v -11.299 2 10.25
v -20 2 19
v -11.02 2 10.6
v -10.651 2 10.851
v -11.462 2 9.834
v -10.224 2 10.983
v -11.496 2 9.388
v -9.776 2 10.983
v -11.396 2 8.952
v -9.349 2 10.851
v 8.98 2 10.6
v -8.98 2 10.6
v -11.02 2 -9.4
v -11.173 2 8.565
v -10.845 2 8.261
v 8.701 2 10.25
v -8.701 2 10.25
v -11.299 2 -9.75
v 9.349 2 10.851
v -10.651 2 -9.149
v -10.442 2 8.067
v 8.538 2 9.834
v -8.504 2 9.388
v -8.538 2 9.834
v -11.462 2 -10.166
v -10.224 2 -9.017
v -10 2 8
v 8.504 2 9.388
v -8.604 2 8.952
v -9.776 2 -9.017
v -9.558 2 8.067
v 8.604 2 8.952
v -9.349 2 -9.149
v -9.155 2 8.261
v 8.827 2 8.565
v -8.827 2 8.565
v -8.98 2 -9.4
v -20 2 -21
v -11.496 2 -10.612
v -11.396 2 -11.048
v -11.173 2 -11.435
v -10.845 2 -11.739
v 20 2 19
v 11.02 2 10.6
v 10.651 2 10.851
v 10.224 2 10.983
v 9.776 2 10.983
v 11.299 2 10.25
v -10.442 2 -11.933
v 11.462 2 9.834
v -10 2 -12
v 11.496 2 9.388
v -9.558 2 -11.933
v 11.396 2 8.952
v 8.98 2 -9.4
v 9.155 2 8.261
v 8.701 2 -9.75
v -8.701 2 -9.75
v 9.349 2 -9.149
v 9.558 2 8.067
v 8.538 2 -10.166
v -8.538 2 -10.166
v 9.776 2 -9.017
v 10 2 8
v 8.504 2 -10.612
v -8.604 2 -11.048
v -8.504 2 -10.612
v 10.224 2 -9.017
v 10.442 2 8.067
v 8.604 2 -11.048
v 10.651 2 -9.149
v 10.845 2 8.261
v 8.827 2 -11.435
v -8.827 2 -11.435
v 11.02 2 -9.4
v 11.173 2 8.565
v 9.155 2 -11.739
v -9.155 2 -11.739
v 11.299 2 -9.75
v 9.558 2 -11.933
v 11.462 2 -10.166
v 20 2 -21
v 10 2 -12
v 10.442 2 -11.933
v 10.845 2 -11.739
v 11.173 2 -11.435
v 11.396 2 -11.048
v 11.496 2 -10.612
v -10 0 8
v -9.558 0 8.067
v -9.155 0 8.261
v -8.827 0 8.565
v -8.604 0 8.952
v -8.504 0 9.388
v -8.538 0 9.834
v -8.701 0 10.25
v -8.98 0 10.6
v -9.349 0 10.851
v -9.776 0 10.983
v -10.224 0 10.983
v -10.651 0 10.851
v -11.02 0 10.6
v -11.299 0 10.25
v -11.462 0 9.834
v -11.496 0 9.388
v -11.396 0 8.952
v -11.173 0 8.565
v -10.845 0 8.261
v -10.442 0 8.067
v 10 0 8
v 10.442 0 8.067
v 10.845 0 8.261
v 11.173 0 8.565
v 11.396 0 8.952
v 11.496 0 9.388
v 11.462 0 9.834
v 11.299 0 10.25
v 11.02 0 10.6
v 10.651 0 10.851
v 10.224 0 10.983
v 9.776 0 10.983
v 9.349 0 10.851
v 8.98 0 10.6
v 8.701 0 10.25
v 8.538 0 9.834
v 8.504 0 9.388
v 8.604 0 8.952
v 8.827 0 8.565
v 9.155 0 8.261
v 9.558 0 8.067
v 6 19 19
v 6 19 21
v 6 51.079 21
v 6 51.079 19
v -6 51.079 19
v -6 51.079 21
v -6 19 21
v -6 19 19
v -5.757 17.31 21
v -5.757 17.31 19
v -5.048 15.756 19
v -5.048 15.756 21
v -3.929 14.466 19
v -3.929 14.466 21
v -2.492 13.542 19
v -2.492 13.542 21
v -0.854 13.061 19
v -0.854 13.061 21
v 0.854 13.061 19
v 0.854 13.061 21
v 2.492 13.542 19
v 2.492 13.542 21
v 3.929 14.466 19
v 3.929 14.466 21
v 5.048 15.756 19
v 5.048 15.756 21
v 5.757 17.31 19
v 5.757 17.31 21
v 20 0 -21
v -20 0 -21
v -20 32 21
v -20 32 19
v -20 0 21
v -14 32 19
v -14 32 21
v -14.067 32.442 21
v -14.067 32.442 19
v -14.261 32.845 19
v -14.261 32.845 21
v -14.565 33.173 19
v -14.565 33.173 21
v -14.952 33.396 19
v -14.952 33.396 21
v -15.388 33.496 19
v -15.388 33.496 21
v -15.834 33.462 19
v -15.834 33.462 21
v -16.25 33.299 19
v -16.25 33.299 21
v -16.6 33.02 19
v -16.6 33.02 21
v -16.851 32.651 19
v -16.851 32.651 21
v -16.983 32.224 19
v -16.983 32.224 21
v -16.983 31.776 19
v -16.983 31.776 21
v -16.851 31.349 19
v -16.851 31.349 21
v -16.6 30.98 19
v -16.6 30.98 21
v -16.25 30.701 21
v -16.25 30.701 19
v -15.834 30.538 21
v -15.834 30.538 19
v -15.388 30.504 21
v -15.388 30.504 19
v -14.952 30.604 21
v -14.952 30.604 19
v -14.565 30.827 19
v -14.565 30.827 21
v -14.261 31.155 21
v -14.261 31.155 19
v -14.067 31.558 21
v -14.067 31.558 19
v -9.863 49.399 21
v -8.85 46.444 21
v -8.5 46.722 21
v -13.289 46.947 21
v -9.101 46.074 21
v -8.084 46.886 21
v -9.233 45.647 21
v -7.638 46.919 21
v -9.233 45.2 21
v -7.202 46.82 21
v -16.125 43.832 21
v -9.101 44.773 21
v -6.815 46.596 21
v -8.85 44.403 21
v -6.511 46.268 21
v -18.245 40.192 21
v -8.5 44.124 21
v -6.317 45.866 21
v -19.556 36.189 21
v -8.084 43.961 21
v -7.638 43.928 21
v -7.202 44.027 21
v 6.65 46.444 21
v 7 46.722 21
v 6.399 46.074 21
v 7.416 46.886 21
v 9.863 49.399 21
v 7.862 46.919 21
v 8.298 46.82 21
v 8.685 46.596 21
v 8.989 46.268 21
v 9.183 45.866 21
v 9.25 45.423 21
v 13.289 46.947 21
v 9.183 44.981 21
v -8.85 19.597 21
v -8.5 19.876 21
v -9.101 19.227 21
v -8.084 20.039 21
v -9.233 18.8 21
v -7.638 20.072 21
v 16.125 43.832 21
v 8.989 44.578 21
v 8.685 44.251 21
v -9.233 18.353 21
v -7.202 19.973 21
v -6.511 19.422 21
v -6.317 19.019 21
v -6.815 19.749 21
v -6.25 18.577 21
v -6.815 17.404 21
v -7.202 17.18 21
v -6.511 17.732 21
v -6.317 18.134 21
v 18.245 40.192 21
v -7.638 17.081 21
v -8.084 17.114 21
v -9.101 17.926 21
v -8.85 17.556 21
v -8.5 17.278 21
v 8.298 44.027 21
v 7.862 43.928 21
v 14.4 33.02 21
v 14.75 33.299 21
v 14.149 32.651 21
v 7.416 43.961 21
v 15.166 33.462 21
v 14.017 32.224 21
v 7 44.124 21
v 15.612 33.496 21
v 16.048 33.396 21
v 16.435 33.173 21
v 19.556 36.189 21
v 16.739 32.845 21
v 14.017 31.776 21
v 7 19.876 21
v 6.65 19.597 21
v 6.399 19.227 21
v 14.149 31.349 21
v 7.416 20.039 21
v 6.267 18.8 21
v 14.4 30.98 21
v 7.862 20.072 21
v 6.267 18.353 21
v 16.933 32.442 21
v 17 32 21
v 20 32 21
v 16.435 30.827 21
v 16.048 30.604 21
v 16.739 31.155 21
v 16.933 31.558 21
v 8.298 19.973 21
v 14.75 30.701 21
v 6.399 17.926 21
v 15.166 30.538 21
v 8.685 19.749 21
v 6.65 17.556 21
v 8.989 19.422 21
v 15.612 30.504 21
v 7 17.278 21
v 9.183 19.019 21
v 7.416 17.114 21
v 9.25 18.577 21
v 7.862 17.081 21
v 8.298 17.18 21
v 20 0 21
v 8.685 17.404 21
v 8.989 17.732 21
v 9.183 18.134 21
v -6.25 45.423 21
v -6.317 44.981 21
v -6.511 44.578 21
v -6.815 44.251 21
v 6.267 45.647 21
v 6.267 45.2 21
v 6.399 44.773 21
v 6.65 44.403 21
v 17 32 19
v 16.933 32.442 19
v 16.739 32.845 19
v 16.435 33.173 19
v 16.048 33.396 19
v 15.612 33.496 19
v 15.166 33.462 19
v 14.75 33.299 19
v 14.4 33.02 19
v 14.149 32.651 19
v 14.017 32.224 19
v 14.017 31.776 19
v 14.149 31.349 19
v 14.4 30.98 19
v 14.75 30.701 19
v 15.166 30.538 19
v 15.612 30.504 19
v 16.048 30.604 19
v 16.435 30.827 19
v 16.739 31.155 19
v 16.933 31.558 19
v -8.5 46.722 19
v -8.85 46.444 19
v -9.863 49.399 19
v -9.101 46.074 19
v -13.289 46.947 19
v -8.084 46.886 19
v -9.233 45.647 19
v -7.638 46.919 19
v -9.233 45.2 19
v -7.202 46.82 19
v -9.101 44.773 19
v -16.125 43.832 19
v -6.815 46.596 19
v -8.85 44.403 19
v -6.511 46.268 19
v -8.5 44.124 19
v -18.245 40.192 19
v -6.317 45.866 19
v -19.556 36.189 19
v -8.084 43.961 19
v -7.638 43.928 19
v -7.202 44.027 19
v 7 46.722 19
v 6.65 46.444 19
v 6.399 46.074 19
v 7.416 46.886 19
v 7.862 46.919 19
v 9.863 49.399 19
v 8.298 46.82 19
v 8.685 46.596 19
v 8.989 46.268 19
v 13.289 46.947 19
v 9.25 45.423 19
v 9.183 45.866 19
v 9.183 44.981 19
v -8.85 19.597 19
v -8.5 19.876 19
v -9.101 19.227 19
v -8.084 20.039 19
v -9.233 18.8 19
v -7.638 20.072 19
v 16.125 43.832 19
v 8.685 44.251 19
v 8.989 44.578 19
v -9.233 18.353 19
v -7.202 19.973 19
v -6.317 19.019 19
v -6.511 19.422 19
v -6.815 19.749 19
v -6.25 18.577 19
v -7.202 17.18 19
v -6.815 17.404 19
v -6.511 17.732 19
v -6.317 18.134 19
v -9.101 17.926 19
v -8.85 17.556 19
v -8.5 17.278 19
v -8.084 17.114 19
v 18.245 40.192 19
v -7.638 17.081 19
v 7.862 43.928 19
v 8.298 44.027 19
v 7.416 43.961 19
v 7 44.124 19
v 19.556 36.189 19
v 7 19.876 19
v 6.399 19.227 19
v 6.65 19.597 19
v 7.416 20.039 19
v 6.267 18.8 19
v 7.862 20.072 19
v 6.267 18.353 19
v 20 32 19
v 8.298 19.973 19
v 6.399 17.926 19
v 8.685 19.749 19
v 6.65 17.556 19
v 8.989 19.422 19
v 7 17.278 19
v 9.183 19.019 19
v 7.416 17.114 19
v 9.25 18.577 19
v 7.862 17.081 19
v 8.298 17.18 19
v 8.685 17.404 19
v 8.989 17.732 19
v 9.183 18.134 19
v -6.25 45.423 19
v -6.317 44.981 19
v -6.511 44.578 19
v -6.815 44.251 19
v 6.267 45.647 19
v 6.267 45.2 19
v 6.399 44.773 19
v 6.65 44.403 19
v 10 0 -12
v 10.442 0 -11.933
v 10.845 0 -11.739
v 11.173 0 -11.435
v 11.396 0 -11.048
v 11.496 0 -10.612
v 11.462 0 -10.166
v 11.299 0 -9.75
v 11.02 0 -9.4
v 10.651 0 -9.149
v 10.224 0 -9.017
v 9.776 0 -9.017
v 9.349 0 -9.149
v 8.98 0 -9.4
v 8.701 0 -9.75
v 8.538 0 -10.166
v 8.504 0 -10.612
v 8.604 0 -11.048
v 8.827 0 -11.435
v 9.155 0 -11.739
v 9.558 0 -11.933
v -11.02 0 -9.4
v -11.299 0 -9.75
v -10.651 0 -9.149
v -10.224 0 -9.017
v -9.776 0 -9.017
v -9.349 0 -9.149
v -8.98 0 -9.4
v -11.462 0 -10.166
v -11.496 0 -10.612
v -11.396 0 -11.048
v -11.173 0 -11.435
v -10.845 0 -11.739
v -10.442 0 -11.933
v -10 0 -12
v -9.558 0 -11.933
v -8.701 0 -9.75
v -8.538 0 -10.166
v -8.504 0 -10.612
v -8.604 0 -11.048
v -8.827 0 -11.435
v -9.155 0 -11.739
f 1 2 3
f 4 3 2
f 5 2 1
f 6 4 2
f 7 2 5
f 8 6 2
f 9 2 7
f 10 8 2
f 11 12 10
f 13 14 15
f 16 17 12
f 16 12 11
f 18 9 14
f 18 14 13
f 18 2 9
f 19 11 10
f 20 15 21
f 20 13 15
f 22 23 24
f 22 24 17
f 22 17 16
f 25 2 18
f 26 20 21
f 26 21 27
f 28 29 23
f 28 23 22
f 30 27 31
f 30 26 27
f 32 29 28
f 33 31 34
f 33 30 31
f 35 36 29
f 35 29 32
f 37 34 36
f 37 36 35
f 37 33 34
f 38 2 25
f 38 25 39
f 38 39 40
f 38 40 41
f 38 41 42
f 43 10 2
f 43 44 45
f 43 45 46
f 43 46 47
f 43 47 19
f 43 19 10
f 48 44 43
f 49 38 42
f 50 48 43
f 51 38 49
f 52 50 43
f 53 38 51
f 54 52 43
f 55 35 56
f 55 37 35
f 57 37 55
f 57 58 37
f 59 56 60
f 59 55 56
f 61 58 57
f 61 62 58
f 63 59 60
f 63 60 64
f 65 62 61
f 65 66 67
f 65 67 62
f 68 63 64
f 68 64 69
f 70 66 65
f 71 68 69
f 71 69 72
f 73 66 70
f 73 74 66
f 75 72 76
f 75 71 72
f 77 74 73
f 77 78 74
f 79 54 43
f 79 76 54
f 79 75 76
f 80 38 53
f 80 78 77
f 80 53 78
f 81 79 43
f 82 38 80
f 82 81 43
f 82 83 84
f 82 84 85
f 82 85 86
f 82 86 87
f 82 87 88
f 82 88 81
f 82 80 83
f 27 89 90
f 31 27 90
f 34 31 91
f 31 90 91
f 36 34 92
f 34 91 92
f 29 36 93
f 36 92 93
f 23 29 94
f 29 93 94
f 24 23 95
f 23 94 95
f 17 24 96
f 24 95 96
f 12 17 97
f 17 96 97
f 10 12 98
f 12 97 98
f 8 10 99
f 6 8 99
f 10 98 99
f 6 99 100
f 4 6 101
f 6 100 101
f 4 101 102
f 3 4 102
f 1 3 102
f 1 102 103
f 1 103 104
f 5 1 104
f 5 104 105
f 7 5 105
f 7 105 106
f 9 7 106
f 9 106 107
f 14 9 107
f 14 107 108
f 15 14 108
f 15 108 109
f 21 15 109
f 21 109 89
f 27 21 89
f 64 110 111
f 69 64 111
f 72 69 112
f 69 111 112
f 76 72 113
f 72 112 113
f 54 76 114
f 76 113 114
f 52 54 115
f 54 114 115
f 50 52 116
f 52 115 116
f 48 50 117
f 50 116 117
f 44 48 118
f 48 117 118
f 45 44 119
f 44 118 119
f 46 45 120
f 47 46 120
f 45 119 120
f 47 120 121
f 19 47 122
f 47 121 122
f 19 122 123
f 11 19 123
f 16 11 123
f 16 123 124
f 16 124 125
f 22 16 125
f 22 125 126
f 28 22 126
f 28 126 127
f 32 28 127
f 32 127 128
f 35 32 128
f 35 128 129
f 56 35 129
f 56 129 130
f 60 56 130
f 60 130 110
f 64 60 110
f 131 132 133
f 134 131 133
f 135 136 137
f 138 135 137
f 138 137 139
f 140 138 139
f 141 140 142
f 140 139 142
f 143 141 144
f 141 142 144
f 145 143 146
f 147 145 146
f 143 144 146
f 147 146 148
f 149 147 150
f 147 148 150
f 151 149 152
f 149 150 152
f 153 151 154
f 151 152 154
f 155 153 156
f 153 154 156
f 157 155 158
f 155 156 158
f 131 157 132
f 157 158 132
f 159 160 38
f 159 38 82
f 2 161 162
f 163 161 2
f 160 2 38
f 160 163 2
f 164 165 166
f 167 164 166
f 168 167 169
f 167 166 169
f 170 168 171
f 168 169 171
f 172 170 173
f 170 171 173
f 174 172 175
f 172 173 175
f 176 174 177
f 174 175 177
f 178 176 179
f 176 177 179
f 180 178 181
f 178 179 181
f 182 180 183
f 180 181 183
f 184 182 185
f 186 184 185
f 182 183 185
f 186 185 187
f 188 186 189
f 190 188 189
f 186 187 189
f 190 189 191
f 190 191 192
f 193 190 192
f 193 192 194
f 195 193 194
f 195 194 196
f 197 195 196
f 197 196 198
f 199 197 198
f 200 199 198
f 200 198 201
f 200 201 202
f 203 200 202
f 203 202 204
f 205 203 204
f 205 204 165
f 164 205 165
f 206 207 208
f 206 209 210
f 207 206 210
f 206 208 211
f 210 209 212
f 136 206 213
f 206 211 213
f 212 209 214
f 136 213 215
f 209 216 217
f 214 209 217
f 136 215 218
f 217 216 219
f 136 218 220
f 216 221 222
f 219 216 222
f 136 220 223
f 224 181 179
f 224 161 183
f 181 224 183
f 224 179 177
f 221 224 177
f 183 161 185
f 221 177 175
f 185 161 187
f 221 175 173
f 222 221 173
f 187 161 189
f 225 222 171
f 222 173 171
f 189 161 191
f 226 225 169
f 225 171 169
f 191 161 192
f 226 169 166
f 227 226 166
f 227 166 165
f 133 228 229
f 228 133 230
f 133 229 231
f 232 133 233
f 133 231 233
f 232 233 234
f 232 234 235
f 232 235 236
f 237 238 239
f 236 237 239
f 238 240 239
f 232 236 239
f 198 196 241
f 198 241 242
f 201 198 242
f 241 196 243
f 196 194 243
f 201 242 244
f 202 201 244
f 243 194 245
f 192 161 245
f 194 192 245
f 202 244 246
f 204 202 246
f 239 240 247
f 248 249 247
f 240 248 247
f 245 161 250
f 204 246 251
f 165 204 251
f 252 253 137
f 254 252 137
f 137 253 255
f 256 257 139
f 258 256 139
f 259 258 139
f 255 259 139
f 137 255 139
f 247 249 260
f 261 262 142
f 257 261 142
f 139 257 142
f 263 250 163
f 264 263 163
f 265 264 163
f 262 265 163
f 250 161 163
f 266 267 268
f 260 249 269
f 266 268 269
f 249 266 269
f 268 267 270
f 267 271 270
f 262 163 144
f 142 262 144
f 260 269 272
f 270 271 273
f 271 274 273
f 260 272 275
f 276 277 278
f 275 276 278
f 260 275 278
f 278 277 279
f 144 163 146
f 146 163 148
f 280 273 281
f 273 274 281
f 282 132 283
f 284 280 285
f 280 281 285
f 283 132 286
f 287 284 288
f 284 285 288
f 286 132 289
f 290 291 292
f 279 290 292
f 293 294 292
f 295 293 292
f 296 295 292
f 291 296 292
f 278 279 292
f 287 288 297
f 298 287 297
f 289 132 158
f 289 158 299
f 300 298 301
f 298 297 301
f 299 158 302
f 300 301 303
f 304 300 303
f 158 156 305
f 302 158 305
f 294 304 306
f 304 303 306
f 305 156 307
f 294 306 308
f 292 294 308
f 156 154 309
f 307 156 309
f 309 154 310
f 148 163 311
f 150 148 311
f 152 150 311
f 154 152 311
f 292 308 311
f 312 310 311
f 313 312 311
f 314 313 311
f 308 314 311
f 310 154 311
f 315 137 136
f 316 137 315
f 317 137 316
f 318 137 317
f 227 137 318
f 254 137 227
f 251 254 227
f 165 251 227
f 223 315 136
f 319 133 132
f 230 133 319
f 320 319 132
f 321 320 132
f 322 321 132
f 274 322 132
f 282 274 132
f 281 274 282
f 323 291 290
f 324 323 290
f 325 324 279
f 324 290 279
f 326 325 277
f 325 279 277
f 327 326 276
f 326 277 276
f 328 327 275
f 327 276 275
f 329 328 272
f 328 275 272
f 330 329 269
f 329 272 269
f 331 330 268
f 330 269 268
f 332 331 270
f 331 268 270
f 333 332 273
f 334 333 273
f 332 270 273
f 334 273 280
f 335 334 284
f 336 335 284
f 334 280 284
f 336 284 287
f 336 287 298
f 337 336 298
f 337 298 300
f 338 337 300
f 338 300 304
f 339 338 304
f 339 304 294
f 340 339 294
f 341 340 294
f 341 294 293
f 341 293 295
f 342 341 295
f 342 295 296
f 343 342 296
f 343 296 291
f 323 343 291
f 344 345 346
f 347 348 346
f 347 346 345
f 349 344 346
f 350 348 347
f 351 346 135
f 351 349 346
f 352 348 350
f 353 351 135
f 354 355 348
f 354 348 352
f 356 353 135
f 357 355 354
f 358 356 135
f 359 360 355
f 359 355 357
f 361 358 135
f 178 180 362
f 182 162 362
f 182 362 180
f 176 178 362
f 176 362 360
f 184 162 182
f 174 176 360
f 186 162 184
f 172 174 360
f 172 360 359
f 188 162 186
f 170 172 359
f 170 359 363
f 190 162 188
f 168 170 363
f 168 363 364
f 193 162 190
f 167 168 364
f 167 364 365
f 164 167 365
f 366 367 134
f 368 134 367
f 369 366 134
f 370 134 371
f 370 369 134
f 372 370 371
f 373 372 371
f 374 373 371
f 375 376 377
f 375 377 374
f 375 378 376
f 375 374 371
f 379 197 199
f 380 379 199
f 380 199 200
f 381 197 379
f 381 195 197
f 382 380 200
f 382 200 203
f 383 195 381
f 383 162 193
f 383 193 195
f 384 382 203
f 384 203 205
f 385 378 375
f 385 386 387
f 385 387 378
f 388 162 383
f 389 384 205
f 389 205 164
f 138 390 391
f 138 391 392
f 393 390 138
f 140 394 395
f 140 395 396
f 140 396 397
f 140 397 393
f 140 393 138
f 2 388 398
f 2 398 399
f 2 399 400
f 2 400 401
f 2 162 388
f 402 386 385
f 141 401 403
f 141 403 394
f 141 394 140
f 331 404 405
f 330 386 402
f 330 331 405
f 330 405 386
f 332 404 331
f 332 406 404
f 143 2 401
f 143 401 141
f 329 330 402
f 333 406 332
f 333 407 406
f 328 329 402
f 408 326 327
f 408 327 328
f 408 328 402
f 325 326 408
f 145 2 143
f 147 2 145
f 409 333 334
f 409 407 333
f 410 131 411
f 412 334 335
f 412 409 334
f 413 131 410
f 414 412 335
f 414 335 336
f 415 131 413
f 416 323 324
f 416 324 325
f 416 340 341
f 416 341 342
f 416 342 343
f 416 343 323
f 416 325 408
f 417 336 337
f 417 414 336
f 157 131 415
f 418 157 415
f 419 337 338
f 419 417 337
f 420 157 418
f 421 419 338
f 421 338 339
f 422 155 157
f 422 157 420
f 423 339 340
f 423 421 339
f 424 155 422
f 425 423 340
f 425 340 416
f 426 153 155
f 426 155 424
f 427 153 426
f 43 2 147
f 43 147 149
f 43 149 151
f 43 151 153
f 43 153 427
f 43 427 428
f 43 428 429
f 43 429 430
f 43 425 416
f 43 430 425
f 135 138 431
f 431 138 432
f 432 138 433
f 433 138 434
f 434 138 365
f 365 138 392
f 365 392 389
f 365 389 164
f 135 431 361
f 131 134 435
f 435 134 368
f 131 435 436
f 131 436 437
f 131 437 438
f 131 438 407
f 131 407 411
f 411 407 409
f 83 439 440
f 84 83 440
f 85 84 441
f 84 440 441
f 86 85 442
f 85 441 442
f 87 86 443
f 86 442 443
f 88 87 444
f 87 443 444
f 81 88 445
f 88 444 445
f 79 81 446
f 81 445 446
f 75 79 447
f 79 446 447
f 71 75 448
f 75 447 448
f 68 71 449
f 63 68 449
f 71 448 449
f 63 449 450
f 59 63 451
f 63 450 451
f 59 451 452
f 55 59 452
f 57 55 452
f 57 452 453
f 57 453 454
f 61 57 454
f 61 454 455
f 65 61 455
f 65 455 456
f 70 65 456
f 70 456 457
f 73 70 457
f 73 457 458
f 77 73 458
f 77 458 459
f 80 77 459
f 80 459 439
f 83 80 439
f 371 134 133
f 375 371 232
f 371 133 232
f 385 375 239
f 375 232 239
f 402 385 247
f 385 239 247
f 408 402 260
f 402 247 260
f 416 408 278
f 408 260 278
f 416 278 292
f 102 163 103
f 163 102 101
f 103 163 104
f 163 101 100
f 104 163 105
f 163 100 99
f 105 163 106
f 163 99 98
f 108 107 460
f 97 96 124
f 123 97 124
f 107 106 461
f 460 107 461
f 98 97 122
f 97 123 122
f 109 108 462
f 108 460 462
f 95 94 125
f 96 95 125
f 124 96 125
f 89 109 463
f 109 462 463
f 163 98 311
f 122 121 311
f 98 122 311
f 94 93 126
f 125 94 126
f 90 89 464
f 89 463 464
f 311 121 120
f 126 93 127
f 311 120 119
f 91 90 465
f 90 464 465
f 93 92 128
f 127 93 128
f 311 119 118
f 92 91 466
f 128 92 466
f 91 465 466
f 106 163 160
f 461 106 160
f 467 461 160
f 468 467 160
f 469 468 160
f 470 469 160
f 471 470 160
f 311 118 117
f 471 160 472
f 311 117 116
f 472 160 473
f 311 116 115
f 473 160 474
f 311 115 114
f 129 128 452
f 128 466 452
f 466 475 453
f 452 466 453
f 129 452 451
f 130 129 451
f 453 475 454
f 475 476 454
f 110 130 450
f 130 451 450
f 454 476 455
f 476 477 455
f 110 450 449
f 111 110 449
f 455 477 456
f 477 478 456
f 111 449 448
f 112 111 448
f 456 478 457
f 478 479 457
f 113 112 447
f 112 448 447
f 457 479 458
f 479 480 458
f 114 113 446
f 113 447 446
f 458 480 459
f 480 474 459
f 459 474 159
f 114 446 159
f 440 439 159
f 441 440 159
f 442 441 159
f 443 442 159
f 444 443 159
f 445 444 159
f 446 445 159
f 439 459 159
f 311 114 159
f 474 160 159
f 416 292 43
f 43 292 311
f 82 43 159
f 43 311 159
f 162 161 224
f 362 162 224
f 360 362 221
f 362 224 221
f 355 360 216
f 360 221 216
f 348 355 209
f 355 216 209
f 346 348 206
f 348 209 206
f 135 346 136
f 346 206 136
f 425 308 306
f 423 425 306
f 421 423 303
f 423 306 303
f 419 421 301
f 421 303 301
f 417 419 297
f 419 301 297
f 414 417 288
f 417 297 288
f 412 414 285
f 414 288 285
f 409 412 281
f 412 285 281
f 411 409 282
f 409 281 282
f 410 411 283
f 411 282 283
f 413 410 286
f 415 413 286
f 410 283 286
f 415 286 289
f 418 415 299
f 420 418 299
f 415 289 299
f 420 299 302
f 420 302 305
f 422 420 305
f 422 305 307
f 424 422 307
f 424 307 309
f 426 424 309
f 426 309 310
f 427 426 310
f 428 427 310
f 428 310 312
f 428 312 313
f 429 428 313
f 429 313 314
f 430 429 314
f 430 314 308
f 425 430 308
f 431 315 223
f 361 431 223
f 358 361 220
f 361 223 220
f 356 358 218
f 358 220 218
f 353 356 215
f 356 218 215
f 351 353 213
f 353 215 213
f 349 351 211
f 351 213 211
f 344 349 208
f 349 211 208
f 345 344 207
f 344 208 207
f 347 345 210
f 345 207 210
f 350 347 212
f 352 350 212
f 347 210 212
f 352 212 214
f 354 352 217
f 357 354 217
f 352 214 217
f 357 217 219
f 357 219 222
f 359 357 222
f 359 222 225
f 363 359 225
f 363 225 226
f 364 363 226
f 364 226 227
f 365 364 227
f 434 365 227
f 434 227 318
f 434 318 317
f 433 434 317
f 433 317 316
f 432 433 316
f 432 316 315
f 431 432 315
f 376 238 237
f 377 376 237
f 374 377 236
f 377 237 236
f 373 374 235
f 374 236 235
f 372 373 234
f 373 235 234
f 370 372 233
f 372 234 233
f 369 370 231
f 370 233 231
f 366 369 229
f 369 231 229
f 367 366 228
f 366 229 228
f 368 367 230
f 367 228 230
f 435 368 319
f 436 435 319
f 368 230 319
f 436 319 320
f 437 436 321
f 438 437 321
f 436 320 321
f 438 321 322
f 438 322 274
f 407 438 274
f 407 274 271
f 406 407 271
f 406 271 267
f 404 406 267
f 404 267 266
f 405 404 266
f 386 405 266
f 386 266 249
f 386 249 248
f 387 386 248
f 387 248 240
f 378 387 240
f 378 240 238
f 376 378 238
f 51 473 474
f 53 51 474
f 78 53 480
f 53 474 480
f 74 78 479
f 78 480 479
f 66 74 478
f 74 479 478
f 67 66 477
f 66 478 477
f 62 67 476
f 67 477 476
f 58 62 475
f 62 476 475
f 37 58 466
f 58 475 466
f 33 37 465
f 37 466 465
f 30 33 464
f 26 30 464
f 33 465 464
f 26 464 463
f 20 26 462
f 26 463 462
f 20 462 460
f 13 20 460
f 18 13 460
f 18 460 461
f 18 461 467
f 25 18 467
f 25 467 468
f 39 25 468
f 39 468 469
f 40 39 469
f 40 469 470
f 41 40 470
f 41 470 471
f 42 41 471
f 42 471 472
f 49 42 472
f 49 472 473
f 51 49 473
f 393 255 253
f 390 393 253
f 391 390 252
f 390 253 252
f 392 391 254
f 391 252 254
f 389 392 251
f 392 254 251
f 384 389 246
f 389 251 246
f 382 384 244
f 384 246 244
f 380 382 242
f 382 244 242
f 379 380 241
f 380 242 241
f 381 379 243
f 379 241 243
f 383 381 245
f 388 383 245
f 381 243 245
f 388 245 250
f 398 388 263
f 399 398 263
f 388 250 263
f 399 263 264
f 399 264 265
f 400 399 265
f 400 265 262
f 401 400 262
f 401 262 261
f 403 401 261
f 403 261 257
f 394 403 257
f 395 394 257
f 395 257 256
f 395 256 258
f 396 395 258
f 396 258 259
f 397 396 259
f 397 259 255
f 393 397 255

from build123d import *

# Parameters (mm, degrees)
SKETCH1_W           = 40
SKETCH1_H           = 42
BOSS_EXTRUDE1_DEPTH = 2
SKETCH2_W           = 40
SKETCH2_H           = 2
BOSS_EXTRUDE2_DEPTH = 50
CUT_EXTRUDE1_DEPTH  = 50
SKETCH4_R           = 1.5
CUT_EXTRUDE2_DEPTH  = 50
CUT_EXTRUDE3_DEPTH  = 1033
SKETCH6_R           = 1.5
CUT_EXTRUDE4_DEPTH  = 1033


with BuildPart() as part:
    # Sketch1 → Boss-Extrude1 (new body)
    with BuildSketch(Plane(origin=(0, 0, 0), x_dir=(1, 0, 0), z_dir=(0, 1, 0))):
        Rectangle(SKETCH1_W, SKETCH1_H)
    extrude(amount=BOSS_EXTRUDE1_DEPTH)

    # Sketch2 → Boss-Extrude2 (add)
    with BuildSketch(Plane(origin=(0, 2, 0), x_dir=(1, 0, 0), z_dir=(0, 1, 0))):
        with Locations((0, -20)):
            Rectangle(SKETCH2_W, SKETCH2_H)
    extrude(amount=BOSS_EXTRUDE2_DEPTH)

    # Sketch3 → Cut-Extrude1 (cut)
    with BuildSketch(Plane.XY.offset(21)):
        with BuildLine():
            Line((-20, 52), (-20, 32))
            ThreePointArc((-20, 32), (-14.142135619, 46.142135629), (1.4e-08, 52))
            Line((1.4e-08, 52), (-20, 52))
        make_face()
        with BuildLine():
            Line((20, 52), (1.4e-08, 52))
            ThreePointArc((1.4e-08, 52), (14.142135629, 46.142135619), (20, 32))
            Line((20, 32), (20, 52))
        make_face()
    extrude(amount=-CUT_EXTRUDE1_DEPTH, mode=Mode.SUBTRACT)

    # Sketch4 → Cut-Extrude2 (cut)
    with BuildSketch(Plane.XY.offset(21)):
        with Locations((-15.5, 32)):
            Circle(SKETCH4_R)
        with Locations((15.5, 32)):
            Circle(SKETCH4_R)
        with Locations((7.75, 18.576606241)):
            Circle(SKETCH4_R)
        with Locations((-7.75, 18.576606241)):
            Circle(SKETCH4_R)
        with Locations((-7.75, 45.423393759)):
            Circle(SKETCH4_R)
        with Locations((7.75, 45.423393759)):
            Circle(SKETCH4_R)
    extrude(amount=-CUT_EXTRUDE2_DEPTH, mode=Mode.SUBTRACT)

    # Sketch5 → Cut-Extrude3 (cut)
    with BuildSketch(Plane.XY.offset(21)):
        with BuildLine():
            ThreePointArc((6, 51.078784028), (0, 52), (-6, 51.078784028))
            Line((-6, 51.078784028), (-6, 19))
            ThreePointArc((-6, 19), (0, 13), (6, 19))
            Line((6, 19), (6, 51.078784028))
        make_face()
    extrude(amount=-CUT_EXTRUDE3_DEPTH, mode=Mode.SUBTRACT)

    # Sketch6 → Cut-Extrude4 (cut)
    with BuildSketch(Plane.XZ):
        with Locations(Location((-10, 9.5, 0), (0, 0, 270))):
            Circle(SKETCH6_R)
        with Locations(Location((10, 9.5, 0), (0, 0, 270))):
            Circle(SKETCH6_R)
        with Locations(Location((10, -10.5, 0), (0, 0, 270))):
            Circle(SKETCH6_R)
        with Locations(Location((-10, -10.5, 0), (0, 0, 270))):
            Circle(SKETCH6_R)
    extrude(amount=-CUT_EXTRUDE4_DEPTH, mode=Mode.SUBTRACT)


solid = part.part
